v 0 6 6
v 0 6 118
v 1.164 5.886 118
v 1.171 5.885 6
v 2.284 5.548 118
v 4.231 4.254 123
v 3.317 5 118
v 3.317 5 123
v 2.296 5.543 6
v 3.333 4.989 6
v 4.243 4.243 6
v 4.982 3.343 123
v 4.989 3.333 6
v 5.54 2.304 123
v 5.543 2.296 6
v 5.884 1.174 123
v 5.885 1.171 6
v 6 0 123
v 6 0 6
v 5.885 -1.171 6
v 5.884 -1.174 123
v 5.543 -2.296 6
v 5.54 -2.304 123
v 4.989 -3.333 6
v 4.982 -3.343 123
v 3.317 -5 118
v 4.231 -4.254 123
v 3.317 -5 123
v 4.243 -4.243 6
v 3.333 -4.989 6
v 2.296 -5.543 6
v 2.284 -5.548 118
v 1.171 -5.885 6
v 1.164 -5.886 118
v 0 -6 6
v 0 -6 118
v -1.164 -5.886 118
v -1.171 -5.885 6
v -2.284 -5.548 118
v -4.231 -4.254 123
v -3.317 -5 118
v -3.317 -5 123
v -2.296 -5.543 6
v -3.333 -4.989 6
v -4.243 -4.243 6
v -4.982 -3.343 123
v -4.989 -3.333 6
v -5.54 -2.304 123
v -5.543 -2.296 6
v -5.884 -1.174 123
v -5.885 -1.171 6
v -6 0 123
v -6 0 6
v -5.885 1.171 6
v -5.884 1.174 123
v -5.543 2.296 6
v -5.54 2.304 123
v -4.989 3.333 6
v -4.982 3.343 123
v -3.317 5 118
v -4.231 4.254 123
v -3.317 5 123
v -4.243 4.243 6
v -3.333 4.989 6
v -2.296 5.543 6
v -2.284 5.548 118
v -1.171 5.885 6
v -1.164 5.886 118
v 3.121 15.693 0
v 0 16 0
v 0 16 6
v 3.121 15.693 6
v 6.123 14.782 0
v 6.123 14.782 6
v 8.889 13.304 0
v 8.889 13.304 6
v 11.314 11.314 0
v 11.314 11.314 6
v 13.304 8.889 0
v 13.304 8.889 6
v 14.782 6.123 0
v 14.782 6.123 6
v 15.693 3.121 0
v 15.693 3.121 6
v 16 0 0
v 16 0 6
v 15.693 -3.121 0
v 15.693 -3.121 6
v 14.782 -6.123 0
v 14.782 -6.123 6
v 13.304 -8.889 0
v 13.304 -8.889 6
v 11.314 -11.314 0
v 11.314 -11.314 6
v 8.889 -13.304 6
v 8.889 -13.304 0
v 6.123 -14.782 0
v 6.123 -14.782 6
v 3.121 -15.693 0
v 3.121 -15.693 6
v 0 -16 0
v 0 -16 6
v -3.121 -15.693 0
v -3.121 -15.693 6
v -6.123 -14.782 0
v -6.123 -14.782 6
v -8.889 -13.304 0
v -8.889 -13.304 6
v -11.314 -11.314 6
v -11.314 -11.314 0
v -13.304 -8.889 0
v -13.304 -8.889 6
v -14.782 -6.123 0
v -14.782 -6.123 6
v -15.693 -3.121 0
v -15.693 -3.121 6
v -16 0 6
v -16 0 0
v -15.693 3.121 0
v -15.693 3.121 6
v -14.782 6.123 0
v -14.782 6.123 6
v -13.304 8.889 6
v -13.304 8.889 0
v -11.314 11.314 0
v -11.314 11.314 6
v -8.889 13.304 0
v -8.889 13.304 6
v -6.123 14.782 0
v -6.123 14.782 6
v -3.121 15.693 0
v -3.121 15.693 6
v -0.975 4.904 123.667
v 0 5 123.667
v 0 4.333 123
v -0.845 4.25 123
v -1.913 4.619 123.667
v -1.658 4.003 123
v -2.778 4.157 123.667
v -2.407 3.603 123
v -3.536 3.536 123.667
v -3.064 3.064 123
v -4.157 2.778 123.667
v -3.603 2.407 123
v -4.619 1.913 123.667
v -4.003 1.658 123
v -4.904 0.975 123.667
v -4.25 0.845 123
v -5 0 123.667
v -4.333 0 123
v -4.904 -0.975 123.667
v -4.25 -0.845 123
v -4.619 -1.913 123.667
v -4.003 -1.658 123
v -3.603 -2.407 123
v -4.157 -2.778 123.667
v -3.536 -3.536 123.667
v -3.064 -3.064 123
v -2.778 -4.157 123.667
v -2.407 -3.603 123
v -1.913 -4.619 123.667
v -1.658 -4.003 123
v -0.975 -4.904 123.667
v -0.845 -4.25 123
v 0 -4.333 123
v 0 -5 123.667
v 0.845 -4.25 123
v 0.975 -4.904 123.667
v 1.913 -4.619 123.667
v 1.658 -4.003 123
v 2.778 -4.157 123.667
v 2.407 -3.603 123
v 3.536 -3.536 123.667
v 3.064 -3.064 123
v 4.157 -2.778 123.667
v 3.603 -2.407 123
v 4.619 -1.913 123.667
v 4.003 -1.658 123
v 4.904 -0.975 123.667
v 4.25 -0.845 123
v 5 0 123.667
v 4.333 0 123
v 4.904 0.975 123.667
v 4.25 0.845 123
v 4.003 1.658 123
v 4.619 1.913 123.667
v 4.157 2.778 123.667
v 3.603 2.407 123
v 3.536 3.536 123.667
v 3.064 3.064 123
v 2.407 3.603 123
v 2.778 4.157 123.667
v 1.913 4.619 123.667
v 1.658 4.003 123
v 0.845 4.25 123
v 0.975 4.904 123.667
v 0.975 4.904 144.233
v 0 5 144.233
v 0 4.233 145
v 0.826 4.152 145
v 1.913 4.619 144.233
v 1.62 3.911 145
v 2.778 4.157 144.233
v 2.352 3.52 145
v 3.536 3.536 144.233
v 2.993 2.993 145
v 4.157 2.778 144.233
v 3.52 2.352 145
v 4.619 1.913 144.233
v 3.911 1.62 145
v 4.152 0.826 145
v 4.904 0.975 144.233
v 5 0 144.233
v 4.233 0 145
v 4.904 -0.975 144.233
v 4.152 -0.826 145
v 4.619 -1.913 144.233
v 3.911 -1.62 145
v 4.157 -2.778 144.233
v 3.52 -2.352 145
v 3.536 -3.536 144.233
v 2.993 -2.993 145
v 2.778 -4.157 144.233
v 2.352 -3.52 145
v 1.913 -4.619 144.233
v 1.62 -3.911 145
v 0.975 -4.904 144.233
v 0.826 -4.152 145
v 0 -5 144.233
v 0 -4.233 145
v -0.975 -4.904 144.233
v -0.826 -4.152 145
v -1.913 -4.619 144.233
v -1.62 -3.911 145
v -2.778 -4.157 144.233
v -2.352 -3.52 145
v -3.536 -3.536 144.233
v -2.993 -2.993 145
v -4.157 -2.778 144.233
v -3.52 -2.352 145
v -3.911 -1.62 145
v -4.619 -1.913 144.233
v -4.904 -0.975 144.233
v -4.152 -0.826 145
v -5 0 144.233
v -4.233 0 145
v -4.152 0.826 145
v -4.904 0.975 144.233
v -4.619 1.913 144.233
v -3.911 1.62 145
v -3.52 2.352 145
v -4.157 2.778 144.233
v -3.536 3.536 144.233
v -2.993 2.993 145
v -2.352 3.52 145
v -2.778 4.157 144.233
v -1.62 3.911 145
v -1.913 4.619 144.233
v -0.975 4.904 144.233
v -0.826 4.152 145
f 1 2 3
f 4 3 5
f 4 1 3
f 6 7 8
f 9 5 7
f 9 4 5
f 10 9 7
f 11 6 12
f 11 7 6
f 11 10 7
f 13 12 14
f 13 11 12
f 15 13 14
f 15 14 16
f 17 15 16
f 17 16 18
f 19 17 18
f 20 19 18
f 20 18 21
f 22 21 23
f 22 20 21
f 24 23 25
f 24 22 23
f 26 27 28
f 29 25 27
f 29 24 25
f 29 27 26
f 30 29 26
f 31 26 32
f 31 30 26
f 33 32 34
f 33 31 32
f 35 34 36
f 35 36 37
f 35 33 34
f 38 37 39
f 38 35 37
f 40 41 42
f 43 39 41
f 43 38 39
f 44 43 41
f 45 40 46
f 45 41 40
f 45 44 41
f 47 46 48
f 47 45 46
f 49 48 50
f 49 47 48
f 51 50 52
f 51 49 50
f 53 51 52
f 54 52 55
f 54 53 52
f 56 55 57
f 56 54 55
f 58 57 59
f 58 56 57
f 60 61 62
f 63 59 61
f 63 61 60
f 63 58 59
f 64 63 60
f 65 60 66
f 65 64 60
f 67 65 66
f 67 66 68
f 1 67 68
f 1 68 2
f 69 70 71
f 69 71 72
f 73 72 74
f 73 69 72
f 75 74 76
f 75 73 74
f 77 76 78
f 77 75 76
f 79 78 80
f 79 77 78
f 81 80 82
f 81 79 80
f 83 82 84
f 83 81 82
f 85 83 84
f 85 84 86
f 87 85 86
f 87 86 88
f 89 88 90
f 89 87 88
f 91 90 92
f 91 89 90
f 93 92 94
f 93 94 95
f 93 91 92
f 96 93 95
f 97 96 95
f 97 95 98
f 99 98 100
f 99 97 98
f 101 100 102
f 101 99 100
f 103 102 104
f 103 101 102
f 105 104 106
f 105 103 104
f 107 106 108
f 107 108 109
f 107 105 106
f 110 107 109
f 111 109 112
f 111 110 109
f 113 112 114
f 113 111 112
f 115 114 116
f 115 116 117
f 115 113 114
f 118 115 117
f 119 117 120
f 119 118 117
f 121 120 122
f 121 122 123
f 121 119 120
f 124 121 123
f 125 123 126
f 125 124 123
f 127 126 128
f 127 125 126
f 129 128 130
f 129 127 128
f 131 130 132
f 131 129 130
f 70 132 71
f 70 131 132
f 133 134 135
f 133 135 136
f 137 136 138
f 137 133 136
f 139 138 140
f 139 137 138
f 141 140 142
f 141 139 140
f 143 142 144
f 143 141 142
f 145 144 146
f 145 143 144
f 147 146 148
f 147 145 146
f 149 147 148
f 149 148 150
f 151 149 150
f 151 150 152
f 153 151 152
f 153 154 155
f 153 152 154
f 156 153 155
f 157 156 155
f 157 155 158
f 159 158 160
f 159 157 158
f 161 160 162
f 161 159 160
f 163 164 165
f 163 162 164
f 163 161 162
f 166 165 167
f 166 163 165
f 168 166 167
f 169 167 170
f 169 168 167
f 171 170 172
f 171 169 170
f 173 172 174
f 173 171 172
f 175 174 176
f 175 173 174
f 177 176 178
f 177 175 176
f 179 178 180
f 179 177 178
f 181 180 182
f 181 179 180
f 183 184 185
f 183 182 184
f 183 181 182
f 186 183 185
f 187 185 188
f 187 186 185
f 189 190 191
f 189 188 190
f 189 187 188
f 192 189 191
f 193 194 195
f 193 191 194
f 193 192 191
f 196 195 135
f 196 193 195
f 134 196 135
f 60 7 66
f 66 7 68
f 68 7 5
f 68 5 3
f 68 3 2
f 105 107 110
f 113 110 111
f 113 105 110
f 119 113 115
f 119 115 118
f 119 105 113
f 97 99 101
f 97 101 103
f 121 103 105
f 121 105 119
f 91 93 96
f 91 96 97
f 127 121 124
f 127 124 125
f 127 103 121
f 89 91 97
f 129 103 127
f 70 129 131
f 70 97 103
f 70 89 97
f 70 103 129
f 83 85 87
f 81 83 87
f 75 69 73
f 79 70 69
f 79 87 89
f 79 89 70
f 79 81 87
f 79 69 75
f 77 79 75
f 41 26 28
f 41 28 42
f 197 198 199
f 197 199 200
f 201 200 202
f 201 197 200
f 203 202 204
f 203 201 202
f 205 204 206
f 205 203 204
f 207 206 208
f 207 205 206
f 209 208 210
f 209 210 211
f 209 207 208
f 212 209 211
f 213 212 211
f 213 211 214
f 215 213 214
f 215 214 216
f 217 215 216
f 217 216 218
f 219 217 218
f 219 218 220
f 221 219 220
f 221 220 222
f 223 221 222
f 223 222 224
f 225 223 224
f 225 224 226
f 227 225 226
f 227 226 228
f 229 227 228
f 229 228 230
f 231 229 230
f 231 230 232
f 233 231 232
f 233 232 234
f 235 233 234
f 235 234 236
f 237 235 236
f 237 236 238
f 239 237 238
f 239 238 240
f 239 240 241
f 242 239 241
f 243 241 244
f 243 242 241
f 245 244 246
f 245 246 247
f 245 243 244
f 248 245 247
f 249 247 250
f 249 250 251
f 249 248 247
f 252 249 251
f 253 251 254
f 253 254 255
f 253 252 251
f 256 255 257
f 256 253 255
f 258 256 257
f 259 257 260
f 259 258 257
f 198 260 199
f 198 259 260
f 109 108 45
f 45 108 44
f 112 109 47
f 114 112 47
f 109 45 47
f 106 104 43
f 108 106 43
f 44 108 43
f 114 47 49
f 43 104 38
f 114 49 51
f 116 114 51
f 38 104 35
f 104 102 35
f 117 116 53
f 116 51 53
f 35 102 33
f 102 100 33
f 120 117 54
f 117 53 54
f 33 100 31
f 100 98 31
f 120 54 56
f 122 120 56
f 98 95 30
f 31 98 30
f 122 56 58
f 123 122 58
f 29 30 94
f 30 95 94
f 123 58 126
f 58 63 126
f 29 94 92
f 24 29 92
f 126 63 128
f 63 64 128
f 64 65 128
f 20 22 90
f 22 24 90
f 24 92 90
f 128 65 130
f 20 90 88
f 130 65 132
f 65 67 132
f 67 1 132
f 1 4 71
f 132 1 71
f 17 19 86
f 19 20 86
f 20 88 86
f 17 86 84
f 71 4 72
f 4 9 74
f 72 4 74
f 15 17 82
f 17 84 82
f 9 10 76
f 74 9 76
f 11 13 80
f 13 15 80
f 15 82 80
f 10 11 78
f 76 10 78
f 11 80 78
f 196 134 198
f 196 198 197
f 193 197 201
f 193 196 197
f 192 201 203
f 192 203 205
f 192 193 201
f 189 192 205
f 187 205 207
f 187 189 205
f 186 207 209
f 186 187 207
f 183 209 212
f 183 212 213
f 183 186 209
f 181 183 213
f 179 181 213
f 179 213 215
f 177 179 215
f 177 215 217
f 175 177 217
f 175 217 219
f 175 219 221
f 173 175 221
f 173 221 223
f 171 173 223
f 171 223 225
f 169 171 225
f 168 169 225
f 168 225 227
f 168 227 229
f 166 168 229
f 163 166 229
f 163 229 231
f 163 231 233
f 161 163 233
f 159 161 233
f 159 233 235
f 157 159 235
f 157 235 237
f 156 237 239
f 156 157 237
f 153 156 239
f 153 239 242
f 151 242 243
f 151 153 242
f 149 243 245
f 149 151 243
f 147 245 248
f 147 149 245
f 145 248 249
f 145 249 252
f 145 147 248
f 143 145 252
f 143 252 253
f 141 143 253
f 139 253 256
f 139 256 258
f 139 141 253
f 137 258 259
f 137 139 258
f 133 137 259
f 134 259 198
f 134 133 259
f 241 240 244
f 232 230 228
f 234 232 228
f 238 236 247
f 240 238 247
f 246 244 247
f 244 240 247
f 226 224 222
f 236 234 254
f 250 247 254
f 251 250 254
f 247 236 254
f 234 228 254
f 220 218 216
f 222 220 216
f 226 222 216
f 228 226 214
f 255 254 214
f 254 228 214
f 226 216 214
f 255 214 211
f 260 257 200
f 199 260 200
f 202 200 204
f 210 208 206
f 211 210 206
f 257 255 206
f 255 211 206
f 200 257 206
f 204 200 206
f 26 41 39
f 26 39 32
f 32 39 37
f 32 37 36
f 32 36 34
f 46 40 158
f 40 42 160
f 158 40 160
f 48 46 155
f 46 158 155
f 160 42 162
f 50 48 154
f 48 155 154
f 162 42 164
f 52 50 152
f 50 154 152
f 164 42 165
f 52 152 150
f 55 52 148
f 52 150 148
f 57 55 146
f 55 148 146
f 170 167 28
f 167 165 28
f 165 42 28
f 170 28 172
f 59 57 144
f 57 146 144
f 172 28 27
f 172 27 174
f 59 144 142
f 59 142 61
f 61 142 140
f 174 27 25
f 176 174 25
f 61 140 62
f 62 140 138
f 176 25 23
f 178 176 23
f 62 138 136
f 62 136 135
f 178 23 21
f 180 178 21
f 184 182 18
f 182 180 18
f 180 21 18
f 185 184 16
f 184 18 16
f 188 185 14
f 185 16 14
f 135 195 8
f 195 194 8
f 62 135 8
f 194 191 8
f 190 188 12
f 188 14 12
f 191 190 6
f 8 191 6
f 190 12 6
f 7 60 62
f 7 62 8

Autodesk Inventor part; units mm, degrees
sketch "Base_KS" plane through (0, 0, 0) normal (1, 0, 0) x (0, 1, 0)
  line L0 (0, 0) -> (0, 122.9)
  line L1 (0, 122.9) -> (3, 122.9)
  line L2 (3, 122.9) -> (3, 6)
  line L3 (3, 6) -> (16, 6)
  line L4 (16, 6) -> (16, 0)
  line L5 (16, 0) -> (0, 0)
  line L6 (0, 0) -> (0, 122.9)
revolve "Revolution1" add sketch "Base_KS" angle 360 about axis through (0, 0, 0) along (0, 0, -1)
sketch "Skizze_2" plane through (0, 0, 0) normal (1, 0, 0) x (0, 1, 0)
  line L0 (0, 0.1) -> (0, 123)
  line L1 (0, 123) -> (6, 123)
  line L2 (6, 123) -> (6, 0.1)
  line L3 (6, 0.1) -> (0, 0.1)
  line L4 (0, 0.1) -> (0, 123)
revolve "Revolution2" add sketch "Skizze_2" angle 360 about axis through (0, 0, 0.1) along (0, 0, -1)
sketch "Skizze_4" plane through (0, 0, 123) normal (0, 0, 1) x (0, 1, 0)
  line L0 (5, 12) -> (5, -12)
  line L1 (5, -12) -> (12, -12)
  line L2 (12, -12) -> (12, 12)
  line L3 (12, 12) -> (5, 12)
extrude "Extrusion1" cut sketch "Skizze_4" along normal mid plane 10
sketch "Skizze_5" plane through (0, 0, 123) normal (0, 0, 1) x (0, 1, 0)
  line L0 (-12, 12) -> (-12, -12)
  line L1 (-12, -12) -> (-5, -12)
  line L2 (-5, -12) -> (-5, 12)
  line L3 (-5, 12) -> (-12, 12)
extrude "Extrusion2" cut sketch "Skizze_5" along normal mid plane 10
sketch "Skizze_8" plane through (0, 0, 0) normal (1, 0, 0) x (0, 1, 0)
  line L0 (0, 122.9) -> (0, 145)
  line L1 (0, 145) -> (4.233, 145)
  line L2 (4.233, 145) -> (5, 144.233)
  line L3 (5, 144.233) -> (5, 123.667)
  line L4 (5, 123.667) -> (4.233, 122.9)
  line L5 (4.233, 122.9) -> (0, 122.9)
  line L6 (0, 122.9) -> (0, 145)
revolve "Revolution3" add sketch "Skizze_8" angle 360 about axis through (0, 0, 122.9) along (0, 0, -1)
thread "Thread1" size "M10x1.25" class "6g" standard "ISO Metric profile" full length
ref_plane "ANSCHRAUB_XY" through (0, 0, 145) normal (0, 0, 1) x (1, 0, 0)
ref_plane "ANSCHRAUB_YZ" through (0, 0, 145) normal (1, 0, 0) x (0, 1, 0)
ref_plane "ANSCHRAUB_ZX" through (0, 0, 145) normal (0, 1, 0) x (0, 0, 1)
ref_plane "CP_30_XY" through (0, 0, 123) normal (0, 0, 1) x (1, 0, 0)
ref_plane "CP_30_YZ" through (0, 0, 123) normal (1, 0, 0) x (0, 1, 0)
ref_plane "CP_30_ZX" through (0, 0, 123) normal (0, 1, 0) x (0, 0, 1)
ref_plane "KS_AUFSATZ1_XY" through (0, 0, 132) normal (0, 0, 1) x (1, 0, 0)
ref_plane "KS_AUFSATZ1_YZ" through (0, 0, 132) normal (1, 0, 0) x (0, 1, 0)
ref_plane "KS_AUFSATZ1_ZX" through (0, 0, 132) normal (0, 1, 0) x (0, 0, 1)
ref_plane "NUT1_XY" through (0, 0, 132) normal (0, 0, -1) x (1, 0, 0)
ref_plane "NUT1_YZ" through (0, 0, 132) normal (1, 0, 0) x (0, -1, 0)
ref_plane "NUT1_ZX" through (0, 0, 132) normal (0, -1, 0) x (0, 0, -1)
ref_plane "ZYLINDER_XY" through (0, 0, 0) normal (0, 0, 1) x (1, 0, 0)
ref_plane "ZYLINDER_YZ" through (0, 0, 0) normal (1, 0, 0) x (0, 1, 0)
ref_plane "ZYLINDER_ZX" through (0, 0, 0) normal (0, 1, 0) x (0, 0, 1)
properties part number "DNC-32-50---(KS)"
